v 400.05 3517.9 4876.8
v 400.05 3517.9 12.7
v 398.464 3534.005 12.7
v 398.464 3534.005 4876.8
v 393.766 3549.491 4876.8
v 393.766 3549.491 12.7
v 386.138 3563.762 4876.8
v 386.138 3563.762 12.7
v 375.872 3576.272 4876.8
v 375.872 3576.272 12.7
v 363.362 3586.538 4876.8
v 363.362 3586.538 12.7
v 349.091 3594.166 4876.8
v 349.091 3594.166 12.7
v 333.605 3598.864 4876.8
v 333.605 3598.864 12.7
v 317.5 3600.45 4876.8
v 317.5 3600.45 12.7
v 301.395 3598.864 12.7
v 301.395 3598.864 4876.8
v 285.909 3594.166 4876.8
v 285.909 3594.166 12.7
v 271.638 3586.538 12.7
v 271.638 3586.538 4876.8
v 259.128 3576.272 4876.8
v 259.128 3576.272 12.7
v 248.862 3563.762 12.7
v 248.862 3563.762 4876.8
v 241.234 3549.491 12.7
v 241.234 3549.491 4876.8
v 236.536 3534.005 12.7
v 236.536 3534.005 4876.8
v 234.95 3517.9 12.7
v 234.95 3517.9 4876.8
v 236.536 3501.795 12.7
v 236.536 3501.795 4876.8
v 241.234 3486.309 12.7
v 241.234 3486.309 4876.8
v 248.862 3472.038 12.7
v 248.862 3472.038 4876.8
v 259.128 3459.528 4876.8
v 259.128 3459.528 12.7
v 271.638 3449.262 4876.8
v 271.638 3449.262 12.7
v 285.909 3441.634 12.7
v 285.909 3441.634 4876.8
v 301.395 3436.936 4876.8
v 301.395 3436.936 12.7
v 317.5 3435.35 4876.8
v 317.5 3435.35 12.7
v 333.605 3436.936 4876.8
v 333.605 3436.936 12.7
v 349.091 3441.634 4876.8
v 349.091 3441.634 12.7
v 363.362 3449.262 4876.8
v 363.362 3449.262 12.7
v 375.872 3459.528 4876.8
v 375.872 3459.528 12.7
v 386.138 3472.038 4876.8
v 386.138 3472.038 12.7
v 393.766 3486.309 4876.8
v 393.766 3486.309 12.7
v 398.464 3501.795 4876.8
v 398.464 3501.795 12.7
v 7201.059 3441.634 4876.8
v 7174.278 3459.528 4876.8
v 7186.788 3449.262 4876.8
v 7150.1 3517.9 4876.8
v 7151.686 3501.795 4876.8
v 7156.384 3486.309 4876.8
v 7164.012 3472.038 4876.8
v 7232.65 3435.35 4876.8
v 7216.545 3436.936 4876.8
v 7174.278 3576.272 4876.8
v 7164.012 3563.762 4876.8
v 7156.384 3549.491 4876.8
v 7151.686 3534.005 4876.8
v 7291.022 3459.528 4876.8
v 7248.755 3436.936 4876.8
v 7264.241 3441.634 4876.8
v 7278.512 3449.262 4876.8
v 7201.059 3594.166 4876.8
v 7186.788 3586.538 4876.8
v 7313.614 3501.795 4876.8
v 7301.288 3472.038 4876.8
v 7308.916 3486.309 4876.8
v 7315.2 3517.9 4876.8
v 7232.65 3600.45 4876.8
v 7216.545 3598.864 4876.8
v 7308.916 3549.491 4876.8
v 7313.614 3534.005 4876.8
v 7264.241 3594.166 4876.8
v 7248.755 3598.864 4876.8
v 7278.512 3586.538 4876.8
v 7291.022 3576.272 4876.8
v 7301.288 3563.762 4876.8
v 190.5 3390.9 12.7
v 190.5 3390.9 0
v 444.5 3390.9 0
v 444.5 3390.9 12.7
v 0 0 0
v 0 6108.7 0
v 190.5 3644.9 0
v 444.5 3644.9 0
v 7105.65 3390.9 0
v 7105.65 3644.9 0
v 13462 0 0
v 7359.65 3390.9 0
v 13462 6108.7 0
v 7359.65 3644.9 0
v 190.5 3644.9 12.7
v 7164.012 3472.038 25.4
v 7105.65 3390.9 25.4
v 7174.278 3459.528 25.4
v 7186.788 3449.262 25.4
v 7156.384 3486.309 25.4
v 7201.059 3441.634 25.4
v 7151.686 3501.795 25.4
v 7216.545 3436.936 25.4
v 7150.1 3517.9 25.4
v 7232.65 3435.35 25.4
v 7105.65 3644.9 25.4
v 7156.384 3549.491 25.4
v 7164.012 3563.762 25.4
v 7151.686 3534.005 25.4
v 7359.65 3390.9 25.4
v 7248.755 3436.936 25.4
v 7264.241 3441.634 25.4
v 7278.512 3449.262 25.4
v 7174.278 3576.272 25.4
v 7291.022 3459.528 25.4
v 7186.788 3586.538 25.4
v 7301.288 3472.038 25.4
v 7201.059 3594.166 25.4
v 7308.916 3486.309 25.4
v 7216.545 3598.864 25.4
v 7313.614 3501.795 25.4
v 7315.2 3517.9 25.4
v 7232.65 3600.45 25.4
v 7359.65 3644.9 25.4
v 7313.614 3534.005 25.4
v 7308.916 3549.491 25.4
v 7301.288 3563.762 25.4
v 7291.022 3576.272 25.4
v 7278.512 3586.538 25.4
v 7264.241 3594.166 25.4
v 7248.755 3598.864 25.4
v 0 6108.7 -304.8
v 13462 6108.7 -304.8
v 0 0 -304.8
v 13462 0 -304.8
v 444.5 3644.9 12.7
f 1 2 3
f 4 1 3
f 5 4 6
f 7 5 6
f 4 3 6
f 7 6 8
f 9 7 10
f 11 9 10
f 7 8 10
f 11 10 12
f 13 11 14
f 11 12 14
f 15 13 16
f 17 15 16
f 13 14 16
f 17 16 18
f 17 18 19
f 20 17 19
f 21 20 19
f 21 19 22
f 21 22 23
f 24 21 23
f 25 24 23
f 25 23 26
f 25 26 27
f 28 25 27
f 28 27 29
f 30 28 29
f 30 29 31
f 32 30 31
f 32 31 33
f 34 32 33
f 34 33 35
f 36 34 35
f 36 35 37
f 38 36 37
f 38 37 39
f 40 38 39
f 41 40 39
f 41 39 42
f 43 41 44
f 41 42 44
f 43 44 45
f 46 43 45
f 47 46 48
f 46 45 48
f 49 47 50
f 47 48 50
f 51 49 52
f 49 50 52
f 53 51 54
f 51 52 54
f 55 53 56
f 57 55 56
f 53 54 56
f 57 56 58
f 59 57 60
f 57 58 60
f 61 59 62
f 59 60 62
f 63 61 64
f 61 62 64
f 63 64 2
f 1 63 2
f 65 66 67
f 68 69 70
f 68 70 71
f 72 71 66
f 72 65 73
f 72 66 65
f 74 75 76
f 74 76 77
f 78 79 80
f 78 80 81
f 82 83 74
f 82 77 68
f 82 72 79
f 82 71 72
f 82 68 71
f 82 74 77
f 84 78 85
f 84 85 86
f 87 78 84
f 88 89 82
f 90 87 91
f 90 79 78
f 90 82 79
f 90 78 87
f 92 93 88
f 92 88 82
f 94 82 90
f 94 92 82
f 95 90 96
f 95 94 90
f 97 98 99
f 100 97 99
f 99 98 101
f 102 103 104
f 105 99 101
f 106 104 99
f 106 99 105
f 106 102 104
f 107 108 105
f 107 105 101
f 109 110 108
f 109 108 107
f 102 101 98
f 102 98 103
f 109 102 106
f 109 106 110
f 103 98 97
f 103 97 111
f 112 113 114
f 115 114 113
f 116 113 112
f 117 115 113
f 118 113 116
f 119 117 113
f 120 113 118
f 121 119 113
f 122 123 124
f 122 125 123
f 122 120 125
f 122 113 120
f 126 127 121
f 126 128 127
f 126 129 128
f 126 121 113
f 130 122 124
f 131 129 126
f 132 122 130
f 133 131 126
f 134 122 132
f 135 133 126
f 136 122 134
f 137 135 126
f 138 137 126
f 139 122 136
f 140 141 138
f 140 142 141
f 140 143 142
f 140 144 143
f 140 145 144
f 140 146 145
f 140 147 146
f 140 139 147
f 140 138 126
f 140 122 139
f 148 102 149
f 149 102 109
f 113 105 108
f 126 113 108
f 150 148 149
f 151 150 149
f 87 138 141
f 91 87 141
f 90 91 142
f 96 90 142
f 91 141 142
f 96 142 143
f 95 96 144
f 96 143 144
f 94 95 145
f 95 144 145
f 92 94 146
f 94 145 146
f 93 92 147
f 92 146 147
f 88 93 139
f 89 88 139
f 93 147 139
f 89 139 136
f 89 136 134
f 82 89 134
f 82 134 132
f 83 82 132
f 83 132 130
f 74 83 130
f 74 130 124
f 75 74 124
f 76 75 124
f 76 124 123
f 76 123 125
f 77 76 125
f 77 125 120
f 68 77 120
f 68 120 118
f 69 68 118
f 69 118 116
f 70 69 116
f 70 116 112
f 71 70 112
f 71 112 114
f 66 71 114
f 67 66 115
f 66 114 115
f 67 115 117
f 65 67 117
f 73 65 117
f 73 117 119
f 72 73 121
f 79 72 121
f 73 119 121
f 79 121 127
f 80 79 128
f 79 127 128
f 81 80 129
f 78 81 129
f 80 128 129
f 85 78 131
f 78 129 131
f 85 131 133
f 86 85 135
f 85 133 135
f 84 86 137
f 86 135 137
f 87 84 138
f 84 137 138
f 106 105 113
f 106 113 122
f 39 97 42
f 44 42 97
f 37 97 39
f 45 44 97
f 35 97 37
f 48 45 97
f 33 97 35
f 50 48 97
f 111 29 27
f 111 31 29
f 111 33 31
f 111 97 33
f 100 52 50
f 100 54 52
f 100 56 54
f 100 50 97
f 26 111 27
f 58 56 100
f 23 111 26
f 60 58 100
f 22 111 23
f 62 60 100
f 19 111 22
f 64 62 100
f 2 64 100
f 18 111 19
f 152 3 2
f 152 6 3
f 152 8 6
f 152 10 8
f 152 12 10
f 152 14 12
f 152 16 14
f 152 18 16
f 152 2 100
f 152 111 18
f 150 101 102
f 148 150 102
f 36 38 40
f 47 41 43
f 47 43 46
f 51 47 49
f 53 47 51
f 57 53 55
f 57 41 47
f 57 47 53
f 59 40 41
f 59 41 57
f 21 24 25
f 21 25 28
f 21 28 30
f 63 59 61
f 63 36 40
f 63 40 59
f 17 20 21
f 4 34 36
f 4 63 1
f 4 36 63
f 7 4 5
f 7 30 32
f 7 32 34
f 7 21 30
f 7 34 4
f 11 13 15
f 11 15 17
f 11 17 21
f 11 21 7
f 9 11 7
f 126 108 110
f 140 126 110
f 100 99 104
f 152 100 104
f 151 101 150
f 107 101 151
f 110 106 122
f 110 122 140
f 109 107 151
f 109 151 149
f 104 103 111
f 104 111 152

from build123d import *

# Parameters (mm, degrees)
F0_W     = 13462
F0_H     = 6108.7
F1_DEPTH = 304.8
F2_W     = 254
F2_H     = 254
F2_R     = 82.55
F3_DEPTH = 12.7
F4_DEPTH = 25.4
F5_DEPTH = 4876.8
F6_DEPTH = 4876.8


with BuildPart() as f1:
    # F0 (on Top) → F1 (new body)
    with BuildSketch(Plane.XY):
        with Locations((6731, 3054.35)):
            Rectangle(F0_W, F0_H)
    extrude(amount=-F1_DEPTH)

    # F2 (on face) → F3 (join)
    with BuildSketch(Plane.XY):
        with Locations((317.5, 3517.9)):
            Rectangle(F2_W, F2_H)
        with Locations((317.5, 3517.9)):
            Circle(F2_R, mode=Mode.SUBTRACT)
    extrude(amount=F3_DEPTH)

    # F2 (on face) → F4 (join)
    with BuildSketch(Plane.XY):
        with Locations((7232.65, 3517.9)):
            Rectangle(F2_W, F2_H)
        with Locations((7232.65, 3517.9)):
            Circle(F2_R, mode=Mode.SUBTRACT)
    extrude(amount=F4_DEPTH)

    # F2 (on face) → F5 (join)
    with BuildSketch(Plane.XY):
        with Locations((317.5, 3517.9)):
            Circle(F2_R)
    extrude(amount=F5_DEPTH)

    # F2 (on face) → F6 (join)
    with BuildSketch(Plane.XY):
        with Locations((7232.65, 3517.9)):
            Circle(F2_R)
    extrude(amount=F6_DEPTH)


solid = f1.part
